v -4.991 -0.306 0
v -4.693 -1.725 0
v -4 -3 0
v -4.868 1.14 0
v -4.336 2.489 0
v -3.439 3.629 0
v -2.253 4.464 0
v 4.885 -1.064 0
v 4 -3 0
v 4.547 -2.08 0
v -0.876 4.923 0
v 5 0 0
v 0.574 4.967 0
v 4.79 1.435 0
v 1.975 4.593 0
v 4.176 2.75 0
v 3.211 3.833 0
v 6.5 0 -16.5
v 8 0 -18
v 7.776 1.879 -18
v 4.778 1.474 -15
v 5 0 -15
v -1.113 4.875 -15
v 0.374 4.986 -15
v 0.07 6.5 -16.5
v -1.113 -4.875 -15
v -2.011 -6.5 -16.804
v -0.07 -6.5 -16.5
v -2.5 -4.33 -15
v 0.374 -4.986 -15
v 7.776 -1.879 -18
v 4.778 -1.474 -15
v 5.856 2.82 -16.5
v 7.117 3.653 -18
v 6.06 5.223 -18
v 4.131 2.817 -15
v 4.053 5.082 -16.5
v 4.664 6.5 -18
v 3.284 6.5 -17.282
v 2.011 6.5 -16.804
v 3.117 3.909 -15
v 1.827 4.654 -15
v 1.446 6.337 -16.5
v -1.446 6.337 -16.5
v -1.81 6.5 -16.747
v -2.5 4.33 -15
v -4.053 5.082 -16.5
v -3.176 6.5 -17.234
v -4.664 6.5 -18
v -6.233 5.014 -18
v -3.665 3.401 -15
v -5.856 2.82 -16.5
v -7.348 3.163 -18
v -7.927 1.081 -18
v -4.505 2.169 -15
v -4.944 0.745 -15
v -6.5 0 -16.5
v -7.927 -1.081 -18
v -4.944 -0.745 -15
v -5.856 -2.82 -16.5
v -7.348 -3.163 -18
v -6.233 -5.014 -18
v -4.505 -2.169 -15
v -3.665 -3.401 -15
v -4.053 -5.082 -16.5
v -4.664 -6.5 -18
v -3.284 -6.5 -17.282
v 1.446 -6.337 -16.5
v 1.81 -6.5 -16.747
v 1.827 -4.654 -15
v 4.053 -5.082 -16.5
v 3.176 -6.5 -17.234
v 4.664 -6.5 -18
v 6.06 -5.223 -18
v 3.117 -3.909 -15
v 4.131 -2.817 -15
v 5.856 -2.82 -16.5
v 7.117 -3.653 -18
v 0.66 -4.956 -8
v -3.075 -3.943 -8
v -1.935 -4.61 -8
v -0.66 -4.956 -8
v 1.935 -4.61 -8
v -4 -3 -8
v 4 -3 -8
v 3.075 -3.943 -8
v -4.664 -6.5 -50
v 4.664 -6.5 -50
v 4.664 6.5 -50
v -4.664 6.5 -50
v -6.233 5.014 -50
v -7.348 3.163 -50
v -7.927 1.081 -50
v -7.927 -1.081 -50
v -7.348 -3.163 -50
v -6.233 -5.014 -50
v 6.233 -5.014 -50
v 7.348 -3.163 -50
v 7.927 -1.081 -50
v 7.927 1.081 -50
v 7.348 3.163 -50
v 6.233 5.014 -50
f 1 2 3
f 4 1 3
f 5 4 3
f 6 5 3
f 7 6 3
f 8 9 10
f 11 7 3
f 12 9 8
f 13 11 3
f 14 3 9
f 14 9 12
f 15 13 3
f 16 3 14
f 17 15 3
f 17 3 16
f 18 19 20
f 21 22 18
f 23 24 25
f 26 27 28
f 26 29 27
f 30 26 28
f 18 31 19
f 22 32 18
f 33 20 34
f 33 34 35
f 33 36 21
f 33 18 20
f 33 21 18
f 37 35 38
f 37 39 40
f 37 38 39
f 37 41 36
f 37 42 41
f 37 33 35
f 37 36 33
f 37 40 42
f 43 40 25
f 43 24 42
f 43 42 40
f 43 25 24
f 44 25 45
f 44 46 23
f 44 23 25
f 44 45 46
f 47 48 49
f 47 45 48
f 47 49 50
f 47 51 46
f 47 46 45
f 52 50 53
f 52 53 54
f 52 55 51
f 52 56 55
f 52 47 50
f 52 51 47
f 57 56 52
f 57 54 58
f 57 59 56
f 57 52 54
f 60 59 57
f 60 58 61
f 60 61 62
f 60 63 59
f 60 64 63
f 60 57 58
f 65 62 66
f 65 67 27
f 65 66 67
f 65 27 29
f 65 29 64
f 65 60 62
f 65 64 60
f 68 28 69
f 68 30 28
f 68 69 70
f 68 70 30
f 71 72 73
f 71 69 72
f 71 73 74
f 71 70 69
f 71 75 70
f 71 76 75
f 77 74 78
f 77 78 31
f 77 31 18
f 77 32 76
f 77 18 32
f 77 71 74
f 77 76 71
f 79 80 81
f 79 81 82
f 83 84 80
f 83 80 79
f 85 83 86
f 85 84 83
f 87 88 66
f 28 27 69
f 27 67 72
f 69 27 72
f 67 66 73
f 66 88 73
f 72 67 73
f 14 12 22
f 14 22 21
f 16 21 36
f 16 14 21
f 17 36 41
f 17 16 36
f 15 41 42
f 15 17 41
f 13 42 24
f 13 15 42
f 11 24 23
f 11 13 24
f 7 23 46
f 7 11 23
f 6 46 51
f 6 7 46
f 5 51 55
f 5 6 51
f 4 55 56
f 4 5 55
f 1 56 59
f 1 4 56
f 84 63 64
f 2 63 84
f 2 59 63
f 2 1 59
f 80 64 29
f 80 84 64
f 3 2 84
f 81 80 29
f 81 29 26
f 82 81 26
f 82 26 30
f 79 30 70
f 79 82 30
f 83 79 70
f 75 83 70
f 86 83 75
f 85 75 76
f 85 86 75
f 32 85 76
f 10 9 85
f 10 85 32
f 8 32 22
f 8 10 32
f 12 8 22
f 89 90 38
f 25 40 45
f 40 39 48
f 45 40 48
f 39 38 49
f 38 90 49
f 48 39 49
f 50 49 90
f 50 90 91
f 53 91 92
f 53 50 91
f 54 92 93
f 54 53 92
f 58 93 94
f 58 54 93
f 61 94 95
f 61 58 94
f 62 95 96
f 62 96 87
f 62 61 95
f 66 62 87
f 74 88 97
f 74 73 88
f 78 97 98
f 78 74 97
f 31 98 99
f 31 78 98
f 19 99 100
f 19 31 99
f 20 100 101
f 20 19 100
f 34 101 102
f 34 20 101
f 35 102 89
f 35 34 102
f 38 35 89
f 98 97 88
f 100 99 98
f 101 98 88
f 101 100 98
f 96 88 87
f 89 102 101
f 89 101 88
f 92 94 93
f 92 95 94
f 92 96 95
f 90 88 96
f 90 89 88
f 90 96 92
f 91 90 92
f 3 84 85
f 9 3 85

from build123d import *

# Parameters (mm, degrees)
F3_W     = 20
F3_H     = 8
F4_DEPTH = 10
F5_W     = 19.943191
F5_H     = 60
F6_DEPTH = 12.5


with BuildPart() as f1:
    # F0 (on Front) → F1 (revolve)
    with BuildSketch(Plane.XZ):
        Polygon((5, 0), (0, 0), (0, -50), (8, -50), (8, -18), (5, -15), align=None)
    revolve(axis=Axis((0, 0, -25), (0, 0, 1)))

    # F3 (on offset) → F4 (cut)
    with BuildSketch(Plane.XZ.offset(3)):
        with Locations((-0.236336, -4)):
            Rectangle(F3_W, F3_H)
    extrude(amount=F4_DEPTH, mode=Mode.SUBTRACT)

    # F5 (on Right) → F6 (cut, symmetric)
    with BuildSketch(Plane.YZ):
        with Locations((16.471595, -30)):
            Rectangle(F5_W, F5_H)
        with Locations((-16.471595, -30)):
            Rectangle(F5_W, F5_H)
    extrude(amount=F6_DEPTH, both=True, mode=Mode.SUBTRACT)


solid = f1.part
